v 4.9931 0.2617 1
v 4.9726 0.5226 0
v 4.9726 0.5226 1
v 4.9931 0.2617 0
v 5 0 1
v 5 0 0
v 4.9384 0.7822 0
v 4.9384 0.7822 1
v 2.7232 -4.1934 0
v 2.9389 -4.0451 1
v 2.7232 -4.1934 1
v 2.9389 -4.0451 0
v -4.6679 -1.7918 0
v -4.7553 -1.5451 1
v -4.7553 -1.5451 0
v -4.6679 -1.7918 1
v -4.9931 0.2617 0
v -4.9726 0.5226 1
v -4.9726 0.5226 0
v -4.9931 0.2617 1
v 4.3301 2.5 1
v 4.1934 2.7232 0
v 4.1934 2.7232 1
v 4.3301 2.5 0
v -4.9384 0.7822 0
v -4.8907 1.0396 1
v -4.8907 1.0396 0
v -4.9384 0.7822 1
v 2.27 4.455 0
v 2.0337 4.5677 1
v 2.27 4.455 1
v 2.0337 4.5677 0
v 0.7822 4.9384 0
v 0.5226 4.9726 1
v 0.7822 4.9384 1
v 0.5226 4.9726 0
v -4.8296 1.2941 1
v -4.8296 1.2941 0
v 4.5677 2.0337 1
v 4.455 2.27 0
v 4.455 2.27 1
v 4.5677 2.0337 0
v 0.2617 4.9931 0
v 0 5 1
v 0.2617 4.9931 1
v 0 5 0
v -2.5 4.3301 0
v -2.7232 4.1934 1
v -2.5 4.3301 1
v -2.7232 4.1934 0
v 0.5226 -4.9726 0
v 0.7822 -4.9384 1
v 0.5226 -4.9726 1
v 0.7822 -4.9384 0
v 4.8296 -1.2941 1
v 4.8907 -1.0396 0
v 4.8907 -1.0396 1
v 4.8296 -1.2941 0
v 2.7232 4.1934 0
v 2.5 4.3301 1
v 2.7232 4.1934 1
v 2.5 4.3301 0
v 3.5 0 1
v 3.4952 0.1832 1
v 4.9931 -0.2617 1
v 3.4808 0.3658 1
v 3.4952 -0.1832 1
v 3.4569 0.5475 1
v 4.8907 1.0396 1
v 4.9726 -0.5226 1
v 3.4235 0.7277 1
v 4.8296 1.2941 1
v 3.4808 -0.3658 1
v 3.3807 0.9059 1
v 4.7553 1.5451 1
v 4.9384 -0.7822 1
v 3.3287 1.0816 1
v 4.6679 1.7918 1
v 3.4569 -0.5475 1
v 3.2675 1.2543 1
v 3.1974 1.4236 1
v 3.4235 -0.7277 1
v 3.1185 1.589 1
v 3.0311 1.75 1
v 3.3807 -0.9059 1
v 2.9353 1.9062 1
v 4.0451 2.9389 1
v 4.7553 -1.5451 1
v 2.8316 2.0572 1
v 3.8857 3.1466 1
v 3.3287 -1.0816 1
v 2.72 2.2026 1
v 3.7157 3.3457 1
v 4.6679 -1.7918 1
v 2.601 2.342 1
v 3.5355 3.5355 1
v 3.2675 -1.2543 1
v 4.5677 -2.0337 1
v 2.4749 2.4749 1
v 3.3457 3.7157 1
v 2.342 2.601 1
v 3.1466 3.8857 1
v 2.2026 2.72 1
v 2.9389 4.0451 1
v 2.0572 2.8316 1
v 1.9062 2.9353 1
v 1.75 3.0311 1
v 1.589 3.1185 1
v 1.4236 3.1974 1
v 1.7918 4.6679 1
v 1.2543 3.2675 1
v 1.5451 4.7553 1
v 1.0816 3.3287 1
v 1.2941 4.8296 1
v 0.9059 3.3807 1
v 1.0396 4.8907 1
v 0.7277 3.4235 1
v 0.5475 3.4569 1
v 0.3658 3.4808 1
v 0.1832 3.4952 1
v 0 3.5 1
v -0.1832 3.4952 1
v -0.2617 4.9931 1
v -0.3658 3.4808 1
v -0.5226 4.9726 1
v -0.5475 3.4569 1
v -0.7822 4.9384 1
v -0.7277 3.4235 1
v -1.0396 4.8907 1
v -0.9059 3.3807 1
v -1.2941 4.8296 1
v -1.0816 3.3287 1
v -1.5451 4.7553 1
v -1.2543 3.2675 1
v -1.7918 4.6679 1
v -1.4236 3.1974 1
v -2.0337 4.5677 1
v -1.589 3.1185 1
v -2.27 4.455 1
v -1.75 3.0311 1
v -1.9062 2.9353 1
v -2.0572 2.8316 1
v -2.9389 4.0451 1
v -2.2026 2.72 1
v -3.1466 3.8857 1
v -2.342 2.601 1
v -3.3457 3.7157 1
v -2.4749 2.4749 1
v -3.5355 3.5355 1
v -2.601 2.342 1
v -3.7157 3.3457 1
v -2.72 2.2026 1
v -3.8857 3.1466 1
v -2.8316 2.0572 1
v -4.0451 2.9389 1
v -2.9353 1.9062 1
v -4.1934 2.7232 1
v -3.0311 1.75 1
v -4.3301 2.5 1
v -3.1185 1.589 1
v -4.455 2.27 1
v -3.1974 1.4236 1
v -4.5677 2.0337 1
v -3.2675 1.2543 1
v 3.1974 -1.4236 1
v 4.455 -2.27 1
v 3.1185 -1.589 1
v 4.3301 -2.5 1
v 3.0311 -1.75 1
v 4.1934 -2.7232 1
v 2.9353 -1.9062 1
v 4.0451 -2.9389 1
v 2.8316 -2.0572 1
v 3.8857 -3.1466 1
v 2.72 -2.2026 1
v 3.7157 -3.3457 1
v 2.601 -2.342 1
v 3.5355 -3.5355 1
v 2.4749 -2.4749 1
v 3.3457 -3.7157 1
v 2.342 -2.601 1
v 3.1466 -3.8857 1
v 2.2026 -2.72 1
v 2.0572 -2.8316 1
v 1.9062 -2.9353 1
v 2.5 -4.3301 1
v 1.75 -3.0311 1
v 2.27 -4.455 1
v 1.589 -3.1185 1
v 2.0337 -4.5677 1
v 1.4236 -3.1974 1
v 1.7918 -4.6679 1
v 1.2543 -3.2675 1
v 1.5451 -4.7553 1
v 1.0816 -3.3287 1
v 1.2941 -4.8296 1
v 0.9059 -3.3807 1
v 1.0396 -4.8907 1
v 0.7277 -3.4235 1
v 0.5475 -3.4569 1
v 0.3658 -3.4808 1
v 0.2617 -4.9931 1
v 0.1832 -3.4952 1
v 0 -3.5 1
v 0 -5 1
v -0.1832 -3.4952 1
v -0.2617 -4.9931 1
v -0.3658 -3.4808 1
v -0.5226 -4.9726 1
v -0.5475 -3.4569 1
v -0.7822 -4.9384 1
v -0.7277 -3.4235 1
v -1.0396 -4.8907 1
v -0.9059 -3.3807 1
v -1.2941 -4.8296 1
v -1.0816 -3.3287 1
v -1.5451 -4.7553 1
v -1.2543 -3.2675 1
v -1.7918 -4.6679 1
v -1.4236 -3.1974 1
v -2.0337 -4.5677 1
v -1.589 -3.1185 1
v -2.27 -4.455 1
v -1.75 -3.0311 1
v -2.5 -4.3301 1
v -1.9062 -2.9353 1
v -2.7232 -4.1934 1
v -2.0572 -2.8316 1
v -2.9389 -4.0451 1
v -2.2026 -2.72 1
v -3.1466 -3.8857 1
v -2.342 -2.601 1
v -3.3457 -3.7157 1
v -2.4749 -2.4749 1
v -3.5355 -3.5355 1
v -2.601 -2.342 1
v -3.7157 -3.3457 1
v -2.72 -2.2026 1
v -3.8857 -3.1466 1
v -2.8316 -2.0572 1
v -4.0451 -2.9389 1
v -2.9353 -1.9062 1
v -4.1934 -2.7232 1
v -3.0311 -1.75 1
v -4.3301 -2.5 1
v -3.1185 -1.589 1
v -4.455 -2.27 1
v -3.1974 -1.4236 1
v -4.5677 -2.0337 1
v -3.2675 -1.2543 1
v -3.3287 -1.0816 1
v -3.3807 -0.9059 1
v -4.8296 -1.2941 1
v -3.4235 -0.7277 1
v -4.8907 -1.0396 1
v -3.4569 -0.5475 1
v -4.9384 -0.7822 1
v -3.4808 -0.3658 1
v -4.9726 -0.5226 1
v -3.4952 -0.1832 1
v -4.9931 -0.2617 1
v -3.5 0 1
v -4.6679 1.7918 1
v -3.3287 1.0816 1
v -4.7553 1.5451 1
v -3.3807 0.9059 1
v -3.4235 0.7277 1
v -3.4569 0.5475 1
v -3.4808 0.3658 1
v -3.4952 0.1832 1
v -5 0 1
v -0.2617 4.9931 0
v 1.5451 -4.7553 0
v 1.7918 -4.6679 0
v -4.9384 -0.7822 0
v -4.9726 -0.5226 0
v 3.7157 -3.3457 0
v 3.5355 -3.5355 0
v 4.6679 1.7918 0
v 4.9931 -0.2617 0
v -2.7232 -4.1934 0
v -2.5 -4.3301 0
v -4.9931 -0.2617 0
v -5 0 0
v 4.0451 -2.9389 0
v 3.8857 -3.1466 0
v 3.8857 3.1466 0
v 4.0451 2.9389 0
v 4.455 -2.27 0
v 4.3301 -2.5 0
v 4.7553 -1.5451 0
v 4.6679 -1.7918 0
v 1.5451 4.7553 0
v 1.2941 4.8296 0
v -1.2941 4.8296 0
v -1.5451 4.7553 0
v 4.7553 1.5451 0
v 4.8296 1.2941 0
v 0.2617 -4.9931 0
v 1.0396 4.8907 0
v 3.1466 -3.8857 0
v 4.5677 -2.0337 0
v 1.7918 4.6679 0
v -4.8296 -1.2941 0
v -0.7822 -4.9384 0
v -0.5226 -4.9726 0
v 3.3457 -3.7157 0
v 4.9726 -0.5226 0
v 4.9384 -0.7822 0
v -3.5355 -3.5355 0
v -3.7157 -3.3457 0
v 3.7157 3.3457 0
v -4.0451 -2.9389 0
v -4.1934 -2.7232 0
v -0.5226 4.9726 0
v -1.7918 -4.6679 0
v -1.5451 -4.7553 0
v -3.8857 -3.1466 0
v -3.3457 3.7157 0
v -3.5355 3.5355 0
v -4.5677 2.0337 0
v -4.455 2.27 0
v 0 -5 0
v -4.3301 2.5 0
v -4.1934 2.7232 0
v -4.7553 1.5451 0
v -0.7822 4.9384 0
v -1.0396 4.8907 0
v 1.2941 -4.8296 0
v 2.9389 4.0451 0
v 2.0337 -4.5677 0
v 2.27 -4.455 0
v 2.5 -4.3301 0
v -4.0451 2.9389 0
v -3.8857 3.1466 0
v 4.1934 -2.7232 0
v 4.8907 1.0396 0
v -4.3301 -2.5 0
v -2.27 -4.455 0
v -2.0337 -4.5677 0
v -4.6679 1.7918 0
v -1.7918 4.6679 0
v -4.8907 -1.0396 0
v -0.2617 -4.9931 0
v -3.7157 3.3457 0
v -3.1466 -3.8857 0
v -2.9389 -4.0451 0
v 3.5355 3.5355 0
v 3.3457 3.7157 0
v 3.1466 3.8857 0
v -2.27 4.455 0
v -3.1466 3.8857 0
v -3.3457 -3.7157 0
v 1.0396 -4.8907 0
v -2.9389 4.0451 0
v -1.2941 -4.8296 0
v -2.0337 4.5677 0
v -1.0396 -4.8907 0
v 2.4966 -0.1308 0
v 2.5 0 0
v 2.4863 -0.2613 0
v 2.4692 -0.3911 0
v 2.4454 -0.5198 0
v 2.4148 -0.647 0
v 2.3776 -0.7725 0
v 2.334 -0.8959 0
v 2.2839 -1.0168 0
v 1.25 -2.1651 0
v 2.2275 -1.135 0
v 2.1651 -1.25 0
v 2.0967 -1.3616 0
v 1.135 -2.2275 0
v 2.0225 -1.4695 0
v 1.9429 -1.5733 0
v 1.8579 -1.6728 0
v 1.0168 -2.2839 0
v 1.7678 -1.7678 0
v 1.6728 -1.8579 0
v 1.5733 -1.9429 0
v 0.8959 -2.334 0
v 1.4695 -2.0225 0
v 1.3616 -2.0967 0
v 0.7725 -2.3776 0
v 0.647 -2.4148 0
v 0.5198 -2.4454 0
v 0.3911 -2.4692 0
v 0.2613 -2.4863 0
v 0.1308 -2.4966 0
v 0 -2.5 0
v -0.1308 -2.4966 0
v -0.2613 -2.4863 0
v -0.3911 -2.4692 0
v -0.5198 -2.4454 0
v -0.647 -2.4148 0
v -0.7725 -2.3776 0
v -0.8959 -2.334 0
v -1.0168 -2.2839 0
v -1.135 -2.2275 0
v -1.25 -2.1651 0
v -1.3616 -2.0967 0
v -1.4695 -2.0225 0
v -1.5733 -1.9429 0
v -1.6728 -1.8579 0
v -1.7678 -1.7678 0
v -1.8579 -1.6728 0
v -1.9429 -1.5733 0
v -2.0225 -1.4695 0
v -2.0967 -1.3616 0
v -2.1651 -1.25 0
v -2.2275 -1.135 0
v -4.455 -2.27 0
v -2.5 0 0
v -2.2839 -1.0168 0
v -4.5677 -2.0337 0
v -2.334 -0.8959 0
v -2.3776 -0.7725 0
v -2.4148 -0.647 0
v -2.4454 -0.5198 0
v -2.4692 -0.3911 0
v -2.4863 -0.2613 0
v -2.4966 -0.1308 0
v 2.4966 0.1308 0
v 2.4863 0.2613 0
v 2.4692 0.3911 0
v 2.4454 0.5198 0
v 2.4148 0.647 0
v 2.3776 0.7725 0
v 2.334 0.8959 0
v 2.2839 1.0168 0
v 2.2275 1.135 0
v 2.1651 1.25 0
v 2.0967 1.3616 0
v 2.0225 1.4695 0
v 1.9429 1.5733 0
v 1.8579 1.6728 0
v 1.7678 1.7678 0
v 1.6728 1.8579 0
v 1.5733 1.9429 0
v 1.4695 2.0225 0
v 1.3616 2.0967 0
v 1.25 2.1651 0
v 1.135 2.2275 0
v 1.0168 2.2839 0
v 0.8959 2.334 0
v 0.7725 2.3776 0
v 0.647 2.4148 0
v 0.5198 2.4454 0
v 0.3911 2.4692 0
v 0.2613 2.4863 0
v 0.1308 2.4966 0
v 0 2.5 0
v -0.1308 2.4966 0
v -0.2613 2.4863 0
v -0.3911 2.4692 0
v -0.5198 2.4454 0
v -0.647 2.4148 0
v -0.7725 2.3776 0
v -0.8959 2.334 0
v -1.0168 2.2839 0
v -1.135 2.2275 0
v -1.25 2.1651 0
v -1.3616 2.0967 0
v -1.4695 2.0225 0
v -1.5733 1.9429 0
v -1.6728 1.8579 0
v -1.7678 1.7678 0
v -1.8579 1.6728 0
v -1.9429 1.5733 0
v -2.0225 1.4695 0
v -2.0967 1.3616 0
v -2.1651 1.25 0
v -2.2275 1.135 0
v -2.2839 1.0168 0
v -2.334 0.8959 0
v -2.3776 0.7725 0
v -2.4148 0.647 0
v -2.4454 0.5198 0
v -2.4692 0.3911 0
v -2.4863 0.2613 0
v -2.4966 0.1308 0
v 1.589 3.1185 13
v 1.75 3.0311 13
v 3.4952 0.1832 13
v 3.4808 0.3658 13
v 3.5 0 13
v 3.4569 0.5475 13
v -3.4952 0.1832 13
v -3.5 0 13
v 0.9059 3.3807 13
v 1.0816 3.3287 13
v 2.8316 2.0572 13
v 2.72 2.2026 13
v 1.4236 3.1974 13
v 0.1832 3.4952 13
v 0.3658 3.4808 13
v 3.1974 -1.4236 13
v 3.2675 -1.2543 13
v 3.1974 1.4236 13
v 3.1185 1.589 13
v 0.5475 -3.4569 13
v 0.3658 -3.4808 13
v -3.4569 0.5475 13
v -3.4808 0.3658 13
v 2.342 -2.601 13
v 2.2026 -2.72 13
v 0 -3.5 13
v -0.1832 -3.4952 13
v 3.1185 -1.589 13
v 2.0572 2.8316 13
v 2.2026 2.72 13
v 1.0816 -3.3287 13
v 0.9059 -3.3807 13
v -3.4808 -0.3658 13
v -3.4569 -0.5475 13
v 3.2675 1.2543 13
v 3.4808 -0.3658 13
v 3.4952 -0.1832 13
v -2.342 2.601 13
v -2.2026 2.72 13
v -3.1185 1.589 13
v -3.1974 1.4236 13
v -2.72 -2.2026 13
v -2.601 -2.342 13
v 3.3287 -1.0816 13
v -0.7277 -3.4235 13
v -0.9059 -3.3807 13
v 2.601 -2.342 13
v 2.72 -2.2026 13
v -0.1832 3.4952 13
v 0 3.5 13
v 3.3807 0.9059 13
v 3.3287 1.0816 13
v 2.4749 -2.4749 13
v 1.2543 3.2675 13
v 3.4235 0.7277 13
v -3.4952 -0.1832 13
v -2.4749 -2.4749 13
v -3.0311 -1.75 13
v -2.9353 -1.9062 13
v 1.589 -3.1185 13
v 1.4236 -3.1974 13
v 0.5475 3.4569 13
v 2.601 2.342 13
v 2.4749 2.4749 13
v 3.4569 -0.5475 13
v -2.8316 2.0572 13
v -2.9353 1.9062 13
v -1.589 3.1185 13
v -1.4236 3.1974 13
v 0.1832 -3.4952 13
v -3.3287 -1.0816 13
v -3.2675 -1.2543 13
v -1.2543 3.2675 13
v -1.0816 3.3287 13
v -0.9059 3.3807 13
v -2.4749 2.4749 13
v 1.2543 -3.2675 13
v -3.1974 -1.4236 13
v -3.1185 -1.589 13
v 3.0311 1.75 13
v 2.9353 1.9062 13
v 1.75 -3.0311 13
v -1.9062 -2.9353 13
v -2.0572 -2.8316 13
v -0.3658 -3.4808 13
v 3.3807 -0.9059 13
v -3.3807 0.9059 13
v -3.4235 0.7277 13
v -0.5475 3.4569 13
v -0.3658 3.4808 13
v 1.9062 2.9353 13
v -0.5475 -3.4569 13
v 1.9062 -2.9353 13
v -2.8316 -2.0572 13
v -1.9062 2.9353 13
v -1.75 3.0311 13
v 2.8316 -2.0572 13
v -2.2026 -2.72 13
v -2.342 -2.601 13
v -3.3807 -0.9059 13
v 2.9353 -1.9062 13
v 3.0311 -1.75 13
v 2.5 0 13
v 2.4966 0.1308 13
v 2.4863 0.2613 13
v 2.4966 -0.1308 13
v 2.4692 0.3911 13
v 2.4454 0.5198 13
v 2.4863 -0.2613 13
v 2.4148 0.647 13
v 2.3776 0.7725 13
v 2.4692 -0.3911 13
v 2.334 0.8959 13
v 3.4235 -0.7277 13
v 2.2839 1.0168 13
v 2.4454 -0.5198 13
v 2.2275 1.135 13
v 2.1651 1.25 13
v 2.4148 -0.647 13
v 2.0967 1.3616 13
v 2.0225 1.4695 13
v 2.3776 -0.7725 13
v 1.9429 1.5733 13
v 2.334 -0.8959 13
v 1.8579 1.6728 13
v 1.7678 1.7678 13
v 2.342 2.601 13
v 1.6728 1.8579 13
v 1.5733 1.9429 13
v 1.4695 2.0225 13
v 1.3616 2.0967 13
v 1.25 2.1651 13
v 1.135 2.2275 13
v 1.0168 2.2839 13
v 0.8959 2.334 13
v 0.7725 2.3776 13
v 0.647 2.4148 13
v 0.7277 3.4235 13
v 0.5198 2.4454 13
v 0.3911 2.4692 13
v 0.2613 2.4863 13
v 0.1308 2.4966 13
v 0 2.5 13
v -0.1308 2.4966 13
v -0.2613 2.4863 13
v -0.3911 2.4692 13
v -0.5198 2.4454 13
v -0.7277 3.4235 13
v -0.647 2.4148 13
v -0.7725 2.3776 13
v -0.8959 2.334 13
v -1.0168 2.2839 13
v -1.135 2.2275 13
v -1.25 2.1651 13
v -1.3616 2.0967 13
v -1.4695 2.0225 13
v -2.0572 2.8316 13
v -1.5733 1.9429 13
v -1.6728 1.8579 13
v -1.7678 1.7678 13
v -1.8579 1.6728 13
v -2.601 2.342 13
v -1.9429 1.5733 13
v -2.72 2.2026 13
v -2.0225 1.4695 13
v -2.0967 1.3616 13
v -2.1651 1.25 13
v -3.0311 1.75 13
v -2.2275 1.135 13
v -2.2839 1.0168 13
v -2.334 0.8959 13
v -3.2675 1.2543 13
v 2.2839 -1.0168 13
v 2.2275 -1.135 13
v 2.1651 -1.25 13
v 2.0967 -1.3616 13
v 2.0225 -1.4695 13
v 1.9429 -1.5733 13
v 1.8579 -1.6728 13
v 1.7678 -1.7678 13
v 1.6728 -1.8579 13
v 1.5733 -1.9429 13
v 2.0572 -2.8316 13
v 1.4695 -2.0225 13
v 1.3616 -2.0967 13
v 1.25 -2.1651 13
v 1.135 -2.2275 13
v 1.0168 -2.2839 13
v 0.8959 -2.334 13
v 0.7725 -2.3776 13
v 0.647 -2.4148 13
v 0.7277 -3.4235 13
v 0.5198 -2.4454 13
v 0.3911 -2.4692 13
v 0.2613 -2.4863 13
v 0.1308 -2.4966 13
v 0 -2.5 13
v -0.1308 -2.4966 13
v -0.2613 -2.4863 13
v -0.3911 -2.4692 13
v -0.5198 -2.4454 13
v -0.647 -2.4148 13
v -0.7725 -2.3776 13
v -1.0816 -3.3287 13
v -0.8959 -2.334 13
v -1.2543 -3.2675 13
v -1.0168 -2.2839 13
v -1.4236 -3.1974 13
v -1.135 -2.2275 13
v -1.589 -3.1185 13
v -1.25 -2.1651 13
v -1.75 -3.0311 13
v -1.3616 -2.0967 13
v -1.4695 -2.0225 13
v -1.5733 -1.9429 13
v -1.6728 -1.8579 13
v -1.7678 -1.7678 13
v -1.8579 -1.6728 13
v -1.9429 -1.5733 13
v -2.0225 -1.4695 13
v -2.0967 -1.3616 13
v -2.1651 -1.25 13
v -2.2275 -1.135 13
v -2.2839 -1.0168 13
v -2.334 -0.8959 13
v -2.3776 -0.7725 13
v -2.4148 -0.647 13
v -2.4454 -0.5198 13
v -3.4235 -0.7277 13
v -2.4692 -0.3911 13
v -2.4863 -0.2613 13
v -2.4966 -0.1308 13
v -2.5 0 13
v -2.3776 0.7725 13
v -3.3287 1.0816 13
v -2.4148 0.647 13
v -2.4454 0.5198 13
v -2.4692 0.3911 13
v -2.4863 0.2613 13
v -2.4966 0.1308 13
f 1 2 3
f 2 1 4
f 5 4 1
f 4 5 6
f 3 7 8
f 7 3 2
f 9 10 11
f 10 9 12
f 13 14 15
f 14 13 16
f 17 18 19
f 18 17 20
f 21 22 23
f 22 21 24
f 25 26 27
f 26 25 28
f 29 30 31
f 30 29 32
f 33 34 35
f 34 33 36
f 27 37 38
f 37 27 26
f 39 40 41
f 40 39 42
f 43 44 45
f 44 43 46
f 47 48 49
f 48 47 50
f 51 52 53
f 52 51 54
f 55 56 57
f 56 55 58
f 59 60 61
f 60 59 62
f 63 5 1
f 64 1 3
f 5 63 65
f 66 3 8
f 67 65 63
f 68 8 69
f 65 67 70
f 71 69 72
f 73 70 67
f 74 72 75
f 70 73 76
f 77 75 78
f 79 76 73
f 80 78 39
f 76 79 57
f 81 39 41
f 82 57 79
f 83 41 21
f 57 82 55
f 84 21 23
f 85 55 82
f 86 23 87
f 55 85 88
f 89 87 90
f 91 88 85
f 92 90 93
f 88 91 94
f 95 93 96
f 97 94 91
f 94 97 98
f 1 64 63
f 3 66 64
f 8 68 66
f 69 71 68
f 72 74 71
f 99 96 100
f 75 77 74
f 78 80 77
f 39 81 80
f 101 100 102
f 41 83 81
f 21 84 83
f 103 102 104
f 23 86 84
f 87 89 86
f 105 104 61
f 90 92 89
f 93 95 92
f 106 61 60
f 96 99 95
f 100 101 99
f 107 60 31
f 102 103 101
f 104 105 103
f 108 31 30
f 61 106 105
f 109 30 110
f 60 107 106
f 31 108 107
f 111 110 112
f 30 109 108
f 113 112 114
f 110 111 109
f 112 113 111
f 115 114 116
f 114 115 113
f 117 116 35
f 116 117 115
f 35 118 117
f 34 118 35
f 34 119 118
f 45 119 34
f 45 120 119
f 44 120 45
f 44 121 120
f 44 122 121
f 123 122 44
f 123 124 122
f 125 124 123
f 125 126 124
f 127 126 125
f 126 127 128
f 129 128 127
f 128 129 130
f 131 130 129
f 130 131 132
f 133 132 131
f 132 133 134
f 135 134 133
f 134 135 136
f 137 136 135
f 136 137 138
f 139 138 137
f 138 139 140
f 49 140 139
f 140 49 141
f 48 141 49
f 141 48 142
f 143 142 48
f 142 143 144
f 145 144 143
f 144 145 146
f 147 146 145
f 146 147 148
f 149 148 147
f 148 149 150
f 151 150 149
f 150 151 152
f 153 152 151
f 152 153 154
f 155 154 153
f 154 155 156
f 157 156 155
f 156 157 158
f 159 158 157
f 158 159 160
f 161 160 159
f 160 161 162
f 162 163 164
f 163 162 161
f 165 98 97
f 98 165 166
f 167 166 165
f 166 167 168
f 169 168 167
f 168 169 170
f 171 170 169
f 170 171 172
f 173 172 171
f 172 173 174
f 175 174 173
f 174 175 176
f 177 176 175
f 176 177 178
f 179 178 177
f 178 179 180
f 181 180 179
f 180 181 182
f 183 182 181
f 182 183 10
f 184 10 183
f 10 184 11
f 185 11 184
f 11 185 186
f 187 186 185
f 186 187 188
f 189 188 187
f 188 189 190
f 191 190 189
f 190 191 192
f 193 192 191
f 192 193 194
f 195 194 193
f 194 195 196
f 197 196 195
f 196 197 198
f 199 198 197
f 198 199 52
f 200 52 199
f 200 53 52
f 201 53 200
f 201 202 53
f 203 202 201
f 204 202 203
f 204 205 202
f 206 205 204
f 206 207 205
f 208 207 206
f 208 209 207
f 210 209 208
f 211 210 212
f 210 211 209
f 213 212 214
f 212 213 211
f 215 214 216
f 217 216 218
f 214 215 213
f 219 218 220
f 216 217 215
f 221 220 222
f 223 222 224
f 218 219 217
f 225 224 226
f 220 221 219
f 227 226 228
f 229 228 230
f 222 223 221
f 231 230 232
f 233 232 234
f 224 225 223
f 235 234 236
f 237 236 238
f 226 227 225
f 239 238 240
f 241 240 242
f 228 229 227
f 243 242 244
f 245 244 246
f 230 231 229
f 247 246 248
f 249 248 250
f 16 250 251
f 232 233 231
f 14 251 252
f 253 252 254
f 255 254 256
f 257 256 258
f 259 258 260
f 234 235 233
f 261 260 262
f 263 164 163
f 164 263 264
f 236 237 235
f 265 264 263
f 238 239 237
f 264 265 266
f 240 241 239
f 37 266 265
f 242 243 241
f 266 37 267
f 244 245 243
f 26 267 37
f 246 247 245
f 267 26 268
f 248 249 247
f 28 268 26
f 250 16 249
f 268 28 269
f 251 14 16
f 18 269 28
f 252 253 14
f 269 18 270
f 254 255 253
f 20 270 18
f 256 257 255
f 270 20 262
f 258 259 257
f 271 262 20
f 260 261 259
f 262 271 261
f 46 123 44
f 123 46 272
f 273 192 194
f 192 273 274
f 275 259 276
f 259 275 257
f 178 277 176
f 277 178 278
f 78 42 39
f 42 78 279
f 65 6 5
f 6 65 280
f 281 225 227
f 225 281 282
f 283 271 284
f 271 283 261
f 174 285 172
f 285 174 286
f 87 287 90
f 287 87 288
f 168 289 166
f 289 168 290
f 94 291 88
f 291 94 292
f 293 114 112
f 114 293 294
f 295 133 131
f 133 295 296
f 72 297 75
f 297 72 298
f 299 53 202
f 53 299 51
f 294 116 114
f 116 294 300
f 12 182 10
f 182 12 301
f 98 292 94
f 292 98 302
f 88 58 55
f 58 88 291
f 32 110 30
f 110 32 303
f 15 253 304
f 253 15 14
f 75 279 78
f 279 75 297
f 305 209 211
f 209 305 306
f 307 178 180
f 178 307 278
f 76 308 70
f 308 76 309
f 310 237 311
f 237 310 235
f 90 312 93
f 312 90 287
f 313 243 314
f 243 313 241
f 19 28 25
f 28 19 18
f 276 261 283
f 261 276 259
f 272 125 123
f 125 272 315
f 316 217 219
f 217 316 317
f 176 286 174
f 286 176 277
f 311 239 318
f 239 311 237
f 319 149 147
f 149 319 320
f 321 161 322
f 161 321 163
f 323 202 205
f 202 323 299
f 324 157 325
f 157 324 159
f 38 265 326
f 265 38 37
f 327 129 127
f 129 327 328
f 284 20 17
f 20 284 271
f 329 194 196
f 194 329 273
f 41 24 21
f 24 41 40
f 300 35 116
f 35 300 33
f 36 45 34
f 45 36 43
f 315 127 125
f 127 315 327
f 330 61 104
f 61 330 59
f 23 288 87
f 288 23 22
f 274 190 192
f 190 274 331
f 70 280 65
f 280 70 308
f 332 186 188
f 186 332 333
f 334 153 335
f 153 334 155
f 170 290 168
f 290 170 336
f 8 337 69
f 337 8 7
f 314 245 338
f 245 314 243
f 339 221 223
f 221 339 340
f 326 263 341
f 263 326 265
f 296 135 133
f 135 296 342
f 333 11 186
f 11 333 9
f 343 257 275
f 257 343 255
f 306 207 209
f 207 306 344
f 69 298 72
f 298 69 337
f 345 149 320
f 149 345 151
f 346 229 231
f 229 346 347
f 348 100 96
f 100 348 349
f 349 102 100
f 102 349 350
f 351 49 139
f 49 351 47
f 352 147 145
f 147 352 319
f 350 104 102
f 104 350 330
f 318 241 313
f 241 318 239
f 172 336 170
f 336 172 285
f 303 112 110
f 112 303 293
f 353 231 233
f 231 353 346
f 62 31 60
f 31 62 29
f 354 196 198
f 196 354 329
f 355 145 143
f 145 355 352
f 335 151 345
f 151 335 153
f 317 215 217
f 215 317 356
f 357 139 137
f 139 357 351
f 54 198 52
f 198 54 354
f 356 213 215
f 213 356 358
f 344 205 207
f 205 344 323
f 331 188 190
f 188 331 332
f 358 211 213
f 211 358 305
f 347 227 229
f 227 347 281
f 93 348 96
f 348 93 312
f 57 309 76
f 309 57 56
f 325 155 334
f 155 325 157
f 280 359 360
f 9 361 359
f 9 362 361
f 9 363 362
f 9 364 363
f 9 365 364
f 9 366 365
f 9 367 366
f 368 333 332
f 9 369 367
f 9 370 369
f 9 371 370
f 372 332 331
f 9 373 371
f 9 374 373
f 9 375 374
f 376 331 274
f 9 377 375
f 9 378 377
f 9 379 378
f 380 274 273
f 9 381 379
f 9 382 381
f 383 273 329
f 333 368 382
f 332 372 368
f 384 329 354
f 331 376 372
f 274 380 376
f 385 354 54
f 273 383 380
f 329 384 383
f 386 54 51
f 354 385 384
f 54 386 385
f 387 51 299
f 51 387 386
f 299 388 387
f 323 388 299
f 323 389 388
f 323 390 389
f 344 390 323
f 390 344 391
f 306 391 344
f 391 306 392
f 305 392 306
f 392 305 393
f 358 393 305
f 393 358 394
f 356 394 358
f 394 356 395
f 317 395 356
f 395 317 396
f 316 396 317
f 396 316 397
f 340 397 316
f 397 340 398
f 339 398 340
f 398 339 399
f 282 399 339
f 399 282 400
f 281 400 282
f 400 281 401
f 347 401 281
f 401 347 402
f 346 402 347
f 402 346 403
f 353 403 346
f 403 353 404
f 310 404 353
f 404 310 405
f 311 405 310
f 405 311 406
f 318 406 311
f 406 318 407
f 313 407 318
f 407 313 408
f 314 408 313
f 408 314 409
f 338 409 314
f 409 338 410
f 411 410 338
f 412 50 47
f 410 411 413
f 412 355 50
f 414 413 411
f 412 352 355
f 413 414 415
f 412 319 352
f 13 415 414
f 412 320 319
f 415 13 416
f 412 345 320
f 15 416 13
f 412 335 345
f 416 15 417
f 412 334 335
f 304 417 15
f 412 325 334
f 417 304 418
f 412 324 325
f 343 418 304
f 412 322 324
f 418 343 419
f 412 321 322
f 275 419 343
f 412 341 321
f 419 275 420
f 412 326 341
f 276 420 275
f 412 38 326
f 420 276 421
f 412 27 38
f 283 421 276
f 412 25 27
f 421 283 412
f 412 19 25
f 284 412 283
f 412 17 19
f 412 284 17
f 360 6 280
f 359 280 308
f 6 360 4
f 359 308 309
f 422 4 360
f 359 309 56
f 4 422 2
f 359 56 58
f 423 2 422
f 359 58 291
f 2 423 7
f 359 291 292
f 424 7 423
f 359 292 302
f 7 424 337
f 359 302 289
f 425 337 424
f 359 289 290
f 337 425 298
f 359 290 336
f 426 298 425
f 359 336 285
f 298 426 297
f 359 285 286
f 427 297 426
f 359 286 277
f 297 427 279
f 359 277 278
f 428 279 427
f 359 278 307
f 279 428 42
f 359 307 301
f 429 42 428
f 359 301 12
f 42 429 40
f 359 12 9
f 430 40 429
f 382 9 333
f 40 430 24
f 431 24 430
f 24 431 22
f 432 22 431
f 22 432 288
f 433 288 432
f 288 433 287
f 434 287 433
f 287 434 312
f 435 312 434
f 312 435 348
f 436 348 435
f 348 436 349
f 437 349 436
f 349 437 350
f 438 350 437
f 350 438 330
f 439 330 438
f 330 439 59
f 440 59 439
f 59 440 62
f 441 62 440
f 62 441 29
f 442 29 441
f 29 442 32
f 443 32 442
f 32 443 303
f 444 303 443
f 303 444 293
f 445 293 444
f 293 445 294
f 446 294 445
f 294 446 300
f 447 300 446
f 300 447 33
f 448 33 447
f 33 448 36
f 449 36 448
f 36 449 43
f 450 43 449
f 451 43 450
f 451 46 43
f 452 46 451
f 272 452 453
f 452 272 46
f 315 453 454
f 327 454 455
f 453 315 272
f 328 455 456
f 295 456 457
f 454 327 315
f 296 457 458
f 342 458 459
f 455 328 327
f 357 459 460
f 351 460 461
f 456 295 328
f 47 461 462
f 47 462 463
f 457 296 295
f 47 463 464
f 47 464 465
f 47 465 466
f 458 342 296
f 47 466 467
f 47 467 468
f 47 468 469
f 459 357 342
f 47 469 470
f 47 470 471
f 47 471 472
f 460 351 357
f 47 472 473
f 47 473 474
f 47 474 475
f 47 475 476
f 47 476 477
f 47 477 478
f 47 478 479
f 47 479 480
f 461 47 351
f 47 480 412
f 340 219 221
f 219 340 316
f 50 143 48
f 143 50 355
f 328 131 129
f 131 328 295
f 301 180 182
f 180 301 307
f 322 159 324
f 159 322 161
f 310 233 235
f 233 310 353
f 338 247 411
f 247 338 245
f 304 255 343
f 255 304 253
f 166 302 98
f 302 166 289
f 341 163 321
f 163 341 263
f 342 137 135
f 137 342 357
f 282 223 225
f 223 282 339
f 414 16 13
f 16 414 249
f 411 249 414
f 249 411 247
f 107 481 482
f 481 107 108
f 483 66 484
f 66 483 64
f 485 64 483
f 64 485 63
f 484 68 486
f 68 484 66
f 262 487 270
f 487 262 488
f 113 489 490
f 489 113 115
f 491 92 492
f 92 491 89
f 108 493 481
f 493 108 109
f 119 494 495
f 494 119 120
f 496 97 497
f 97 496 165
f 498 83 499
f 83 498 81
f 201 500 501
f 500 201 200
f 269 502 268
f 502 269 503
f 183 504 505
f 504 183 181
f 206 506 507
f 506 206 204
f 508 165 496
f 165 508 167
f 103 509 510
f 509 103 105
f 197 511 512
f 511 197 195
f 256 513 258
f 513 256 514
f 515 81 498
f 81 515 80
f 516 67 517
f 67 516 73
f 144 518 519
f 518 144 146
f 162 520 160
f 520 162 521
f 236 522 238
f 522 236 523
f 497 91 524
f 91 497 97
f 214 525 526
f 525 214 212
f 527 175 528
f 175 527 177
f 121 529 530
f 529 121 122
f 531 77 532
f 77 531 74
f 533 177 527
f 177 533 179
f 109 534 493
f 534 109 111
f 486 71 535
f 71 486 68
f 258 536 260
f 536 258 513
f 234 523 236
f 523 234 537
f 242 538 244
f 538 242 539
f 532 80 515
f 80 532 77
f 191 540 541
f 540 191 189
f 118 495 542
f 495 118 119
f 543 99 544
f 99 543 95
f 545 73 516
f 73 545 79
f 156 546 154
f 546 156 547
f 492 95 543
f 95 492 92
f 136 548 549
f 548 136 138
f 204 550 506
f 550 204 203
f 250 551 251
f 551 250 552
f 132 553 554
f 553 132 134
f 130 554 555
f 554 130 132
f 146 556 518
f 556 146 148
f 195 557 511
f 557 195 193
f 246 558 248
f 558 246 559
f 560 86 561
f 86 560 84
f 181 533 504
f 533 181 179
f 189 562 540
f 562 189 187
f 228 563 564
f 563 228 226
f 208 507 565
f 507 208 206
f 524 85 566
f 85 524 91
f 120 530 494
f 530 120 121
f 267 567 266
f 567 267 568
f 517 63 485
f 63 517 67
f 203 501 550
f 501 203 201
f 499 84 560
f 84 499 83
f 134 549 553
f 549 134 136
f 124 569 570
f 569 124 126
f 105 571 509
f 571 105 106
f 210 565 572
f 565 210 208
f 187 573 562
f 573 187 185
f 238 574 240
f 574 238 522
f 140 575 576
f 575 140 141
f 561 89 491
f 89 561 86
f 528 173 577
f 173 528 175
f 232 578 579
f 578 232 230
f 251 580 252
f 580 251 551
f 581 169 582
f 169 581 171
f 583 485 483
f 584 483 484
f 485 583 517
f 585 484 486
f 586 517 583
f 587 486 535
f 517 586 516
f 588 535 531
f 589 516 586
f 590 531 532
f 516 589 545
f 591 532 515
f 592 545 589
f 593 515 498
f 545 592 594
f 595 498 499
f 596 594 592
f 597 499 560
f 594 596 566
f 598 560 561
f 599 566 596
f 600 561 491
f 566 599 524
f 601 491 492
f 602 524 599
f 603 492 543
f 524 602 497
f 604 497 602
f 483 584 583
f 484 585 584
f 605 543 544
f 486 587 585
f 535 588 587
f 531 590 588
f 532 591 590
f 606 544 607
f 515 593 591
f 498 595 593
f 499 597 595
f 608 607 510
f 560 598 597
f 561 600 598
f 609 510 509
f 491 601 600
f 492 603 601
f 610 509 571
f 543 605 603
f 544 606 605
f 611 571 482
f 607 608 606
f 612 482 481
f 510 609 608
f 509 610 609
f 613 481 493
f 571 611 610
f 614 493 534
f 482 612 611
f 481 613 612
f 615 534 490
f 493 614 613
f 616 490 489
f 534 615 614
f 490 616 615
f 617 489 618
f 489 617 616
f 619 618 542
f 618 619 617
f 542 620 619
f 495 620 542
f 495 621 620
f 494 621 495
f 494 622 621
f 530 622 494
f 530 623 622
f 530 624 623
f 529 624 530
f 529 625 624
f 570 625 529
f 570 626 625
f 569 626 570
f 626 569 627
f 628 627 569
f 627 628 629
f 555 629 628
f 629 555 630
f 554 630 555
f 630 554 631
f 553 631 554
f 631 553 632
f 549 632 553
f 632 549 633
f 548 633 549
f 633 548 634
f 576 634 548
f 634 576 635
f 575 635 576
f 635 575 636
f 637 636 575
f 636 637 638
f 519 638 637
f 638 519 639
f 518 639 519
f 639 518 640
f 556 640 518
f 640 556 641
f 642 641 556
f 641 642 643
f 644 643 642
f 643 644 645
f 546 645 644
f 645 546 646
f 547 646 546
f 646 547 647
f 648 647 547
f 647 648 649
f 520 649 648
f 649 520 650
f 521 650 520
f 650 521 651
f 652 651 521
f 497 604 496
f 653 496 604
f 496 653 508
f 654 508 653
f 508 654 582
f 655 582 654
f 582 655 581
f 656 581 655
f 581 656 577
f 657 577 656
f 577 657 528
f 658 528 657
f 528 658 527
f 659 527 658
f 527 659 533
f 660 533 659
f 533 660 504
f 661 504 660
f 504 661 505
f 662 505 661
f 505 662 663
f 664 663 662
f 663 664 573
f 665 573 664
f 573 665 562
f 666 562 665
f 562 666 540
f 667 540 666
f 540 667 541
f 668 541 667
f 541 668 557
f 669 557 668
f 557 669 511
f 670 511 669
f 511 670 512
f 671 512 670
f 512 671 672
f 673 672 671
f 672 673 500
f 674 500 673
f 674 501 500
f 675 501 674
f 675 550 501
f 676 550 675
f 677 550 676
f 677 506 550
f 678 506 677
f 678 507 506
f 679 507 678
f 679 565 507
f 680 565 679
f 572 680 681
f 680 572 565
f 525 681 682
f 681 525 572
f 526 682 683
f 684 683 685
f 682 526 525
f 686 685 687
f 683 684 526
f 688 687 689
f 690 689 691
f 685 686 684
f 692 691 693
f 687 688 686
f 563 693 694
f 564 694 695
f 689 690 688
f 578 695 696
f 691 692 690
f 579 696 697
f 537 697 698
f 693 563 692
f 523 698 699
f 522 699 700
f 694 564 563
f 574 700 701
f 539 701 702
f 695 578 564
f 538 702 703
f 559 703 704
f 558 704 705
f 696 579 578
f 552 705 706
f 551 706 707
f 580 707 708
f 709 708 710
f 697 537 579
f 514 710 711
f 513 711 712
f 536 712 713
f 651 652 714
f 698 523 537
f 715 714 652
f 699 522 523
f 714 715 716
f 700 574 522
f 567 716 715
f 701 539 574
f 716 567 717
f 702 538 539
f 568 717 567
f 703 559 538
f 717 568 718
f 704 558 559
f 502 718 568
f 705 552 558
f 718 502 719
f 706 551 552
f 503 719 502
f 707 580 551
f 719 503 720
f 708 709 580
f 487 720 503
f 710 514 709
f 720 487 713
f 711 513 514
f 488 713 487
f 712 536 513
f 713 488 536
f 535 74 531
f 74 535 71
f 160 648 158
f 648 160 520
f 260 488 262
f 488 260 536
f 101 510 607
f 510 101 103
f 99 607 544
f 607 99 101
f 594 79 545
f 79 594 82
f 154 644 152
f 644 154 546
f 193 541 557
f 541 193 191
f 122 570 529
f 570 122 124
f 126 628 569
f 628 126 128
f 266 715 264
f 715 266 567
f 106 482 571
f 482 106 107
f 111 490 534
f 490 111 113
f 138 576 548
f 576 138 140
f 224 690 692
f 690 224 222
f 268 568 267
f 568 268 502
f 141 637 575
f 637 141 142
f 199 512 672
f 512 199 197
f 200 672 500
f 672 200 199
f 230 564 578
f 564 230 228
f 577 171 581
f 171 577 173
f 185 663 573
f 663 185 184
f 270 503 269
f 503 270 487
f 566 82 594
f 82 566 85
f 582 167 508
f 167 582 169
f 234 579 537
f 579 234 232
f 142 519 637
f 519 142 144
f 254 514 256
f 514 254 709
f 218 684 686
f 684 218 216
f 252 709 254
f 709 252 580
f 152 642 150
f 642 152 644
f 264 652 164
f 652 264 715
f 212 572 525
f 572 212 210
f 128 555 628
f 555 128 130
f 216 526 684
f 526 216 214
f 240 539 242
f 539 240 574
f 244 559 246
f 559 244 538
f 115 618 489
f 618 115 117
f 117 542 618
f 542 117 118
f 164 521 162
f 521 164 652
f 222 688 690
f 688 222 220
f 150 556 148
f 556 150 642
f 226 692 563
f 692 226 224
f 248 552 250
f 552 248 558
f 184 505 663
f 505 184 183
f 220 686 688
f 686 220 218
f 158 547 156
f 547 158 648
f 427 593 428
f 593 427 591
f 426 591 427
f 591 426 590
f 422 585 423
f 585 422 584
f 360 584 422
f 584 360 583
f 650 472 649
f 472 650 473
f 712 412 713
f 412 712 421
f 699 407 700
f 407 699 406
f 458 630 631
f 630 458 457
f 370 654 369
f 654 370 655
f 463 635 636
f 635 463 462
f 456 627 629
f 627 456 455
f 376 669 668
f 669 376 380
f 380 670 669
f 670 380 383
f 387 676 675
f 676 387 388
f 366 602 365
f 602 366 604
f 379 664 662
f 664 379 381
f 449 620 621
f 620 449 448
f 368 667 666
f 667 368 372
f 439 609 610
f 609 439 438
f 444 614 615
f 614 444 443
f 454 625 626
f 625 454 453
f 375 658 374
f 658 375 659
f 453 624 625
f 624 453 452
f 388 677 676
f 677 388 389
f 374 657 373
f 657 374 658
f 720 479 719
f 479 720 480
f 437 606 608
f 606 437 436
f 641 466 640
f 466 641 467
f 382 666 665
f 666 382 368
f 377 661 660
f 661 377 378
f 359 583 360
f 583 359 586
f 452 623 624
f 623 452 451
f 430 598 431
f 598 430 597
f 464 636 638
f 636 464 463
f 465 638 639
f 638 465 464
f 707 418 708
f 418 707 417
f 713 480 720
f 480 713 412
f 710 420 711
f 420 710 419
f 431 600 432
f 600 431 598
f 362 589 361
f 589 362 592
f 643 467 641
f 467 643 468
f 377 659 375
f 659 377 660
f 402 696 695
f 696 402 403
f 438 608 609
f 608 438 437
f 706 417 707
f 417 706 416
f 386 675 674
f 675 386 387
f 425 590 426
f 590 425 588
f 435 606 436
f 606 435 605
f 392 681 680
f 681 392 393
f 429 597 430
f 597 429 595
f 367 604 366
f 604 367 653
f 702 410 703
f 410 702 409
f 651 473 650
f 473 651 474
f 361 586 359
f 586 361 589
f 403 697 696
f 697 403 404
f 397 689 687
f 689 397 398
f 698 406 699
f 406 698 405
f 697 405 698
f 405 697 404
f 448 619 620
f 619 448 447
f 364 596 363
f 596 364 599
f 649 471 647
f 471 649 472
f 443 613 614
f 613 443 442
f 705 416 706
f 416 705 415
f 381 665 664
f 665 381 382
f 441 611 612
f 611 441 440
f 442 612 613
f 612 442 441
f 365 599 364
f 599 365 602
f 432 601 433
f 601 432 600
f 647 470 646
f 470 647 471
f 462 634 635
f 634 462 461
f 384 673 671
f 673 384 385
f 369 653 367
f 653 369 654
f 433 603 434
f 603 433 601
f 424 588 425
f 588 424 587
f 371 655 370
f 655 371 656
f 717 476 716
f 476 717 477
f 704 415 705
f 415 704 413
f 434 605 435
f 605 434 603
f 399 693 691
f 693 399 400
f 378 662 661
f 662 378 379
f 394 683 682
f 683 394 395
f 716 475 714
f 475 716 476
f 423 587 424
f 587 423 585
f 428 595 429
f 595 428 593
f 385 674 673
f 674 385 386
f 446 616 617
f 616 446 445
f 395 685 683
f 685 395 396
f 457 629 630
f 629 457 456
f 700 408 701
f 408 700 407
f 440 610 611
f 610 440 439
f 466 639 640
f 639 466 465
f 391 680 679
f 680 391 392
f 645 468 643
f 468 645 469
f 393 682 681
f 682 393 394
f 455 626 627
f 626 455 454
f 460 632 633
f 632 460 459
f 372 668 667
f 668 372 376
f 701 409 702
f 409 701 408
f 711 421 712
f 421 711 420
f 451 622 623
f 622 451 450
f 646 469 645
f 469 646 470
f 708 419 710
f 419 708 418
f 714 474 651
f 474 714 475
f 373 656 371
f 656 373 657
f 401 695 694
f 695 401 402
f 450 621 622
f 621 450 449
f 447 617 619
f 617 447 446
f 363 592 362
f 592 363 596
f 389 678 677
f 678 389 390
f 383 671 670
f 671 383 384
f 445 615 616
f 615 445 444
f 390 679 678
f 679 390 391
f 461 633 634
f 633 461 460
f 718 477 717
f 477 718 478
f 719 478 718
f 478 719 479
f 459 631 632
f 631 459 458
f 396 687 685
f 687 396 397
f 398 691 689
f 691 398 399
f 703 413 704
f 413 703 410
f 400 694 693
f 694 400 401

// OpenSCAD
// Real Lonely T-Rex Game: Wall Mount Spacer
// Copyright (C) 2017, Uri Shaked and Ariella Eliassaf

$fn = 120;

difference() {
    union() {
        cylinder(h=1, r=5);
        cylinder(h=13, r=3.5);
    }
    
    cylinder(h=13, r=2.5);
}    
